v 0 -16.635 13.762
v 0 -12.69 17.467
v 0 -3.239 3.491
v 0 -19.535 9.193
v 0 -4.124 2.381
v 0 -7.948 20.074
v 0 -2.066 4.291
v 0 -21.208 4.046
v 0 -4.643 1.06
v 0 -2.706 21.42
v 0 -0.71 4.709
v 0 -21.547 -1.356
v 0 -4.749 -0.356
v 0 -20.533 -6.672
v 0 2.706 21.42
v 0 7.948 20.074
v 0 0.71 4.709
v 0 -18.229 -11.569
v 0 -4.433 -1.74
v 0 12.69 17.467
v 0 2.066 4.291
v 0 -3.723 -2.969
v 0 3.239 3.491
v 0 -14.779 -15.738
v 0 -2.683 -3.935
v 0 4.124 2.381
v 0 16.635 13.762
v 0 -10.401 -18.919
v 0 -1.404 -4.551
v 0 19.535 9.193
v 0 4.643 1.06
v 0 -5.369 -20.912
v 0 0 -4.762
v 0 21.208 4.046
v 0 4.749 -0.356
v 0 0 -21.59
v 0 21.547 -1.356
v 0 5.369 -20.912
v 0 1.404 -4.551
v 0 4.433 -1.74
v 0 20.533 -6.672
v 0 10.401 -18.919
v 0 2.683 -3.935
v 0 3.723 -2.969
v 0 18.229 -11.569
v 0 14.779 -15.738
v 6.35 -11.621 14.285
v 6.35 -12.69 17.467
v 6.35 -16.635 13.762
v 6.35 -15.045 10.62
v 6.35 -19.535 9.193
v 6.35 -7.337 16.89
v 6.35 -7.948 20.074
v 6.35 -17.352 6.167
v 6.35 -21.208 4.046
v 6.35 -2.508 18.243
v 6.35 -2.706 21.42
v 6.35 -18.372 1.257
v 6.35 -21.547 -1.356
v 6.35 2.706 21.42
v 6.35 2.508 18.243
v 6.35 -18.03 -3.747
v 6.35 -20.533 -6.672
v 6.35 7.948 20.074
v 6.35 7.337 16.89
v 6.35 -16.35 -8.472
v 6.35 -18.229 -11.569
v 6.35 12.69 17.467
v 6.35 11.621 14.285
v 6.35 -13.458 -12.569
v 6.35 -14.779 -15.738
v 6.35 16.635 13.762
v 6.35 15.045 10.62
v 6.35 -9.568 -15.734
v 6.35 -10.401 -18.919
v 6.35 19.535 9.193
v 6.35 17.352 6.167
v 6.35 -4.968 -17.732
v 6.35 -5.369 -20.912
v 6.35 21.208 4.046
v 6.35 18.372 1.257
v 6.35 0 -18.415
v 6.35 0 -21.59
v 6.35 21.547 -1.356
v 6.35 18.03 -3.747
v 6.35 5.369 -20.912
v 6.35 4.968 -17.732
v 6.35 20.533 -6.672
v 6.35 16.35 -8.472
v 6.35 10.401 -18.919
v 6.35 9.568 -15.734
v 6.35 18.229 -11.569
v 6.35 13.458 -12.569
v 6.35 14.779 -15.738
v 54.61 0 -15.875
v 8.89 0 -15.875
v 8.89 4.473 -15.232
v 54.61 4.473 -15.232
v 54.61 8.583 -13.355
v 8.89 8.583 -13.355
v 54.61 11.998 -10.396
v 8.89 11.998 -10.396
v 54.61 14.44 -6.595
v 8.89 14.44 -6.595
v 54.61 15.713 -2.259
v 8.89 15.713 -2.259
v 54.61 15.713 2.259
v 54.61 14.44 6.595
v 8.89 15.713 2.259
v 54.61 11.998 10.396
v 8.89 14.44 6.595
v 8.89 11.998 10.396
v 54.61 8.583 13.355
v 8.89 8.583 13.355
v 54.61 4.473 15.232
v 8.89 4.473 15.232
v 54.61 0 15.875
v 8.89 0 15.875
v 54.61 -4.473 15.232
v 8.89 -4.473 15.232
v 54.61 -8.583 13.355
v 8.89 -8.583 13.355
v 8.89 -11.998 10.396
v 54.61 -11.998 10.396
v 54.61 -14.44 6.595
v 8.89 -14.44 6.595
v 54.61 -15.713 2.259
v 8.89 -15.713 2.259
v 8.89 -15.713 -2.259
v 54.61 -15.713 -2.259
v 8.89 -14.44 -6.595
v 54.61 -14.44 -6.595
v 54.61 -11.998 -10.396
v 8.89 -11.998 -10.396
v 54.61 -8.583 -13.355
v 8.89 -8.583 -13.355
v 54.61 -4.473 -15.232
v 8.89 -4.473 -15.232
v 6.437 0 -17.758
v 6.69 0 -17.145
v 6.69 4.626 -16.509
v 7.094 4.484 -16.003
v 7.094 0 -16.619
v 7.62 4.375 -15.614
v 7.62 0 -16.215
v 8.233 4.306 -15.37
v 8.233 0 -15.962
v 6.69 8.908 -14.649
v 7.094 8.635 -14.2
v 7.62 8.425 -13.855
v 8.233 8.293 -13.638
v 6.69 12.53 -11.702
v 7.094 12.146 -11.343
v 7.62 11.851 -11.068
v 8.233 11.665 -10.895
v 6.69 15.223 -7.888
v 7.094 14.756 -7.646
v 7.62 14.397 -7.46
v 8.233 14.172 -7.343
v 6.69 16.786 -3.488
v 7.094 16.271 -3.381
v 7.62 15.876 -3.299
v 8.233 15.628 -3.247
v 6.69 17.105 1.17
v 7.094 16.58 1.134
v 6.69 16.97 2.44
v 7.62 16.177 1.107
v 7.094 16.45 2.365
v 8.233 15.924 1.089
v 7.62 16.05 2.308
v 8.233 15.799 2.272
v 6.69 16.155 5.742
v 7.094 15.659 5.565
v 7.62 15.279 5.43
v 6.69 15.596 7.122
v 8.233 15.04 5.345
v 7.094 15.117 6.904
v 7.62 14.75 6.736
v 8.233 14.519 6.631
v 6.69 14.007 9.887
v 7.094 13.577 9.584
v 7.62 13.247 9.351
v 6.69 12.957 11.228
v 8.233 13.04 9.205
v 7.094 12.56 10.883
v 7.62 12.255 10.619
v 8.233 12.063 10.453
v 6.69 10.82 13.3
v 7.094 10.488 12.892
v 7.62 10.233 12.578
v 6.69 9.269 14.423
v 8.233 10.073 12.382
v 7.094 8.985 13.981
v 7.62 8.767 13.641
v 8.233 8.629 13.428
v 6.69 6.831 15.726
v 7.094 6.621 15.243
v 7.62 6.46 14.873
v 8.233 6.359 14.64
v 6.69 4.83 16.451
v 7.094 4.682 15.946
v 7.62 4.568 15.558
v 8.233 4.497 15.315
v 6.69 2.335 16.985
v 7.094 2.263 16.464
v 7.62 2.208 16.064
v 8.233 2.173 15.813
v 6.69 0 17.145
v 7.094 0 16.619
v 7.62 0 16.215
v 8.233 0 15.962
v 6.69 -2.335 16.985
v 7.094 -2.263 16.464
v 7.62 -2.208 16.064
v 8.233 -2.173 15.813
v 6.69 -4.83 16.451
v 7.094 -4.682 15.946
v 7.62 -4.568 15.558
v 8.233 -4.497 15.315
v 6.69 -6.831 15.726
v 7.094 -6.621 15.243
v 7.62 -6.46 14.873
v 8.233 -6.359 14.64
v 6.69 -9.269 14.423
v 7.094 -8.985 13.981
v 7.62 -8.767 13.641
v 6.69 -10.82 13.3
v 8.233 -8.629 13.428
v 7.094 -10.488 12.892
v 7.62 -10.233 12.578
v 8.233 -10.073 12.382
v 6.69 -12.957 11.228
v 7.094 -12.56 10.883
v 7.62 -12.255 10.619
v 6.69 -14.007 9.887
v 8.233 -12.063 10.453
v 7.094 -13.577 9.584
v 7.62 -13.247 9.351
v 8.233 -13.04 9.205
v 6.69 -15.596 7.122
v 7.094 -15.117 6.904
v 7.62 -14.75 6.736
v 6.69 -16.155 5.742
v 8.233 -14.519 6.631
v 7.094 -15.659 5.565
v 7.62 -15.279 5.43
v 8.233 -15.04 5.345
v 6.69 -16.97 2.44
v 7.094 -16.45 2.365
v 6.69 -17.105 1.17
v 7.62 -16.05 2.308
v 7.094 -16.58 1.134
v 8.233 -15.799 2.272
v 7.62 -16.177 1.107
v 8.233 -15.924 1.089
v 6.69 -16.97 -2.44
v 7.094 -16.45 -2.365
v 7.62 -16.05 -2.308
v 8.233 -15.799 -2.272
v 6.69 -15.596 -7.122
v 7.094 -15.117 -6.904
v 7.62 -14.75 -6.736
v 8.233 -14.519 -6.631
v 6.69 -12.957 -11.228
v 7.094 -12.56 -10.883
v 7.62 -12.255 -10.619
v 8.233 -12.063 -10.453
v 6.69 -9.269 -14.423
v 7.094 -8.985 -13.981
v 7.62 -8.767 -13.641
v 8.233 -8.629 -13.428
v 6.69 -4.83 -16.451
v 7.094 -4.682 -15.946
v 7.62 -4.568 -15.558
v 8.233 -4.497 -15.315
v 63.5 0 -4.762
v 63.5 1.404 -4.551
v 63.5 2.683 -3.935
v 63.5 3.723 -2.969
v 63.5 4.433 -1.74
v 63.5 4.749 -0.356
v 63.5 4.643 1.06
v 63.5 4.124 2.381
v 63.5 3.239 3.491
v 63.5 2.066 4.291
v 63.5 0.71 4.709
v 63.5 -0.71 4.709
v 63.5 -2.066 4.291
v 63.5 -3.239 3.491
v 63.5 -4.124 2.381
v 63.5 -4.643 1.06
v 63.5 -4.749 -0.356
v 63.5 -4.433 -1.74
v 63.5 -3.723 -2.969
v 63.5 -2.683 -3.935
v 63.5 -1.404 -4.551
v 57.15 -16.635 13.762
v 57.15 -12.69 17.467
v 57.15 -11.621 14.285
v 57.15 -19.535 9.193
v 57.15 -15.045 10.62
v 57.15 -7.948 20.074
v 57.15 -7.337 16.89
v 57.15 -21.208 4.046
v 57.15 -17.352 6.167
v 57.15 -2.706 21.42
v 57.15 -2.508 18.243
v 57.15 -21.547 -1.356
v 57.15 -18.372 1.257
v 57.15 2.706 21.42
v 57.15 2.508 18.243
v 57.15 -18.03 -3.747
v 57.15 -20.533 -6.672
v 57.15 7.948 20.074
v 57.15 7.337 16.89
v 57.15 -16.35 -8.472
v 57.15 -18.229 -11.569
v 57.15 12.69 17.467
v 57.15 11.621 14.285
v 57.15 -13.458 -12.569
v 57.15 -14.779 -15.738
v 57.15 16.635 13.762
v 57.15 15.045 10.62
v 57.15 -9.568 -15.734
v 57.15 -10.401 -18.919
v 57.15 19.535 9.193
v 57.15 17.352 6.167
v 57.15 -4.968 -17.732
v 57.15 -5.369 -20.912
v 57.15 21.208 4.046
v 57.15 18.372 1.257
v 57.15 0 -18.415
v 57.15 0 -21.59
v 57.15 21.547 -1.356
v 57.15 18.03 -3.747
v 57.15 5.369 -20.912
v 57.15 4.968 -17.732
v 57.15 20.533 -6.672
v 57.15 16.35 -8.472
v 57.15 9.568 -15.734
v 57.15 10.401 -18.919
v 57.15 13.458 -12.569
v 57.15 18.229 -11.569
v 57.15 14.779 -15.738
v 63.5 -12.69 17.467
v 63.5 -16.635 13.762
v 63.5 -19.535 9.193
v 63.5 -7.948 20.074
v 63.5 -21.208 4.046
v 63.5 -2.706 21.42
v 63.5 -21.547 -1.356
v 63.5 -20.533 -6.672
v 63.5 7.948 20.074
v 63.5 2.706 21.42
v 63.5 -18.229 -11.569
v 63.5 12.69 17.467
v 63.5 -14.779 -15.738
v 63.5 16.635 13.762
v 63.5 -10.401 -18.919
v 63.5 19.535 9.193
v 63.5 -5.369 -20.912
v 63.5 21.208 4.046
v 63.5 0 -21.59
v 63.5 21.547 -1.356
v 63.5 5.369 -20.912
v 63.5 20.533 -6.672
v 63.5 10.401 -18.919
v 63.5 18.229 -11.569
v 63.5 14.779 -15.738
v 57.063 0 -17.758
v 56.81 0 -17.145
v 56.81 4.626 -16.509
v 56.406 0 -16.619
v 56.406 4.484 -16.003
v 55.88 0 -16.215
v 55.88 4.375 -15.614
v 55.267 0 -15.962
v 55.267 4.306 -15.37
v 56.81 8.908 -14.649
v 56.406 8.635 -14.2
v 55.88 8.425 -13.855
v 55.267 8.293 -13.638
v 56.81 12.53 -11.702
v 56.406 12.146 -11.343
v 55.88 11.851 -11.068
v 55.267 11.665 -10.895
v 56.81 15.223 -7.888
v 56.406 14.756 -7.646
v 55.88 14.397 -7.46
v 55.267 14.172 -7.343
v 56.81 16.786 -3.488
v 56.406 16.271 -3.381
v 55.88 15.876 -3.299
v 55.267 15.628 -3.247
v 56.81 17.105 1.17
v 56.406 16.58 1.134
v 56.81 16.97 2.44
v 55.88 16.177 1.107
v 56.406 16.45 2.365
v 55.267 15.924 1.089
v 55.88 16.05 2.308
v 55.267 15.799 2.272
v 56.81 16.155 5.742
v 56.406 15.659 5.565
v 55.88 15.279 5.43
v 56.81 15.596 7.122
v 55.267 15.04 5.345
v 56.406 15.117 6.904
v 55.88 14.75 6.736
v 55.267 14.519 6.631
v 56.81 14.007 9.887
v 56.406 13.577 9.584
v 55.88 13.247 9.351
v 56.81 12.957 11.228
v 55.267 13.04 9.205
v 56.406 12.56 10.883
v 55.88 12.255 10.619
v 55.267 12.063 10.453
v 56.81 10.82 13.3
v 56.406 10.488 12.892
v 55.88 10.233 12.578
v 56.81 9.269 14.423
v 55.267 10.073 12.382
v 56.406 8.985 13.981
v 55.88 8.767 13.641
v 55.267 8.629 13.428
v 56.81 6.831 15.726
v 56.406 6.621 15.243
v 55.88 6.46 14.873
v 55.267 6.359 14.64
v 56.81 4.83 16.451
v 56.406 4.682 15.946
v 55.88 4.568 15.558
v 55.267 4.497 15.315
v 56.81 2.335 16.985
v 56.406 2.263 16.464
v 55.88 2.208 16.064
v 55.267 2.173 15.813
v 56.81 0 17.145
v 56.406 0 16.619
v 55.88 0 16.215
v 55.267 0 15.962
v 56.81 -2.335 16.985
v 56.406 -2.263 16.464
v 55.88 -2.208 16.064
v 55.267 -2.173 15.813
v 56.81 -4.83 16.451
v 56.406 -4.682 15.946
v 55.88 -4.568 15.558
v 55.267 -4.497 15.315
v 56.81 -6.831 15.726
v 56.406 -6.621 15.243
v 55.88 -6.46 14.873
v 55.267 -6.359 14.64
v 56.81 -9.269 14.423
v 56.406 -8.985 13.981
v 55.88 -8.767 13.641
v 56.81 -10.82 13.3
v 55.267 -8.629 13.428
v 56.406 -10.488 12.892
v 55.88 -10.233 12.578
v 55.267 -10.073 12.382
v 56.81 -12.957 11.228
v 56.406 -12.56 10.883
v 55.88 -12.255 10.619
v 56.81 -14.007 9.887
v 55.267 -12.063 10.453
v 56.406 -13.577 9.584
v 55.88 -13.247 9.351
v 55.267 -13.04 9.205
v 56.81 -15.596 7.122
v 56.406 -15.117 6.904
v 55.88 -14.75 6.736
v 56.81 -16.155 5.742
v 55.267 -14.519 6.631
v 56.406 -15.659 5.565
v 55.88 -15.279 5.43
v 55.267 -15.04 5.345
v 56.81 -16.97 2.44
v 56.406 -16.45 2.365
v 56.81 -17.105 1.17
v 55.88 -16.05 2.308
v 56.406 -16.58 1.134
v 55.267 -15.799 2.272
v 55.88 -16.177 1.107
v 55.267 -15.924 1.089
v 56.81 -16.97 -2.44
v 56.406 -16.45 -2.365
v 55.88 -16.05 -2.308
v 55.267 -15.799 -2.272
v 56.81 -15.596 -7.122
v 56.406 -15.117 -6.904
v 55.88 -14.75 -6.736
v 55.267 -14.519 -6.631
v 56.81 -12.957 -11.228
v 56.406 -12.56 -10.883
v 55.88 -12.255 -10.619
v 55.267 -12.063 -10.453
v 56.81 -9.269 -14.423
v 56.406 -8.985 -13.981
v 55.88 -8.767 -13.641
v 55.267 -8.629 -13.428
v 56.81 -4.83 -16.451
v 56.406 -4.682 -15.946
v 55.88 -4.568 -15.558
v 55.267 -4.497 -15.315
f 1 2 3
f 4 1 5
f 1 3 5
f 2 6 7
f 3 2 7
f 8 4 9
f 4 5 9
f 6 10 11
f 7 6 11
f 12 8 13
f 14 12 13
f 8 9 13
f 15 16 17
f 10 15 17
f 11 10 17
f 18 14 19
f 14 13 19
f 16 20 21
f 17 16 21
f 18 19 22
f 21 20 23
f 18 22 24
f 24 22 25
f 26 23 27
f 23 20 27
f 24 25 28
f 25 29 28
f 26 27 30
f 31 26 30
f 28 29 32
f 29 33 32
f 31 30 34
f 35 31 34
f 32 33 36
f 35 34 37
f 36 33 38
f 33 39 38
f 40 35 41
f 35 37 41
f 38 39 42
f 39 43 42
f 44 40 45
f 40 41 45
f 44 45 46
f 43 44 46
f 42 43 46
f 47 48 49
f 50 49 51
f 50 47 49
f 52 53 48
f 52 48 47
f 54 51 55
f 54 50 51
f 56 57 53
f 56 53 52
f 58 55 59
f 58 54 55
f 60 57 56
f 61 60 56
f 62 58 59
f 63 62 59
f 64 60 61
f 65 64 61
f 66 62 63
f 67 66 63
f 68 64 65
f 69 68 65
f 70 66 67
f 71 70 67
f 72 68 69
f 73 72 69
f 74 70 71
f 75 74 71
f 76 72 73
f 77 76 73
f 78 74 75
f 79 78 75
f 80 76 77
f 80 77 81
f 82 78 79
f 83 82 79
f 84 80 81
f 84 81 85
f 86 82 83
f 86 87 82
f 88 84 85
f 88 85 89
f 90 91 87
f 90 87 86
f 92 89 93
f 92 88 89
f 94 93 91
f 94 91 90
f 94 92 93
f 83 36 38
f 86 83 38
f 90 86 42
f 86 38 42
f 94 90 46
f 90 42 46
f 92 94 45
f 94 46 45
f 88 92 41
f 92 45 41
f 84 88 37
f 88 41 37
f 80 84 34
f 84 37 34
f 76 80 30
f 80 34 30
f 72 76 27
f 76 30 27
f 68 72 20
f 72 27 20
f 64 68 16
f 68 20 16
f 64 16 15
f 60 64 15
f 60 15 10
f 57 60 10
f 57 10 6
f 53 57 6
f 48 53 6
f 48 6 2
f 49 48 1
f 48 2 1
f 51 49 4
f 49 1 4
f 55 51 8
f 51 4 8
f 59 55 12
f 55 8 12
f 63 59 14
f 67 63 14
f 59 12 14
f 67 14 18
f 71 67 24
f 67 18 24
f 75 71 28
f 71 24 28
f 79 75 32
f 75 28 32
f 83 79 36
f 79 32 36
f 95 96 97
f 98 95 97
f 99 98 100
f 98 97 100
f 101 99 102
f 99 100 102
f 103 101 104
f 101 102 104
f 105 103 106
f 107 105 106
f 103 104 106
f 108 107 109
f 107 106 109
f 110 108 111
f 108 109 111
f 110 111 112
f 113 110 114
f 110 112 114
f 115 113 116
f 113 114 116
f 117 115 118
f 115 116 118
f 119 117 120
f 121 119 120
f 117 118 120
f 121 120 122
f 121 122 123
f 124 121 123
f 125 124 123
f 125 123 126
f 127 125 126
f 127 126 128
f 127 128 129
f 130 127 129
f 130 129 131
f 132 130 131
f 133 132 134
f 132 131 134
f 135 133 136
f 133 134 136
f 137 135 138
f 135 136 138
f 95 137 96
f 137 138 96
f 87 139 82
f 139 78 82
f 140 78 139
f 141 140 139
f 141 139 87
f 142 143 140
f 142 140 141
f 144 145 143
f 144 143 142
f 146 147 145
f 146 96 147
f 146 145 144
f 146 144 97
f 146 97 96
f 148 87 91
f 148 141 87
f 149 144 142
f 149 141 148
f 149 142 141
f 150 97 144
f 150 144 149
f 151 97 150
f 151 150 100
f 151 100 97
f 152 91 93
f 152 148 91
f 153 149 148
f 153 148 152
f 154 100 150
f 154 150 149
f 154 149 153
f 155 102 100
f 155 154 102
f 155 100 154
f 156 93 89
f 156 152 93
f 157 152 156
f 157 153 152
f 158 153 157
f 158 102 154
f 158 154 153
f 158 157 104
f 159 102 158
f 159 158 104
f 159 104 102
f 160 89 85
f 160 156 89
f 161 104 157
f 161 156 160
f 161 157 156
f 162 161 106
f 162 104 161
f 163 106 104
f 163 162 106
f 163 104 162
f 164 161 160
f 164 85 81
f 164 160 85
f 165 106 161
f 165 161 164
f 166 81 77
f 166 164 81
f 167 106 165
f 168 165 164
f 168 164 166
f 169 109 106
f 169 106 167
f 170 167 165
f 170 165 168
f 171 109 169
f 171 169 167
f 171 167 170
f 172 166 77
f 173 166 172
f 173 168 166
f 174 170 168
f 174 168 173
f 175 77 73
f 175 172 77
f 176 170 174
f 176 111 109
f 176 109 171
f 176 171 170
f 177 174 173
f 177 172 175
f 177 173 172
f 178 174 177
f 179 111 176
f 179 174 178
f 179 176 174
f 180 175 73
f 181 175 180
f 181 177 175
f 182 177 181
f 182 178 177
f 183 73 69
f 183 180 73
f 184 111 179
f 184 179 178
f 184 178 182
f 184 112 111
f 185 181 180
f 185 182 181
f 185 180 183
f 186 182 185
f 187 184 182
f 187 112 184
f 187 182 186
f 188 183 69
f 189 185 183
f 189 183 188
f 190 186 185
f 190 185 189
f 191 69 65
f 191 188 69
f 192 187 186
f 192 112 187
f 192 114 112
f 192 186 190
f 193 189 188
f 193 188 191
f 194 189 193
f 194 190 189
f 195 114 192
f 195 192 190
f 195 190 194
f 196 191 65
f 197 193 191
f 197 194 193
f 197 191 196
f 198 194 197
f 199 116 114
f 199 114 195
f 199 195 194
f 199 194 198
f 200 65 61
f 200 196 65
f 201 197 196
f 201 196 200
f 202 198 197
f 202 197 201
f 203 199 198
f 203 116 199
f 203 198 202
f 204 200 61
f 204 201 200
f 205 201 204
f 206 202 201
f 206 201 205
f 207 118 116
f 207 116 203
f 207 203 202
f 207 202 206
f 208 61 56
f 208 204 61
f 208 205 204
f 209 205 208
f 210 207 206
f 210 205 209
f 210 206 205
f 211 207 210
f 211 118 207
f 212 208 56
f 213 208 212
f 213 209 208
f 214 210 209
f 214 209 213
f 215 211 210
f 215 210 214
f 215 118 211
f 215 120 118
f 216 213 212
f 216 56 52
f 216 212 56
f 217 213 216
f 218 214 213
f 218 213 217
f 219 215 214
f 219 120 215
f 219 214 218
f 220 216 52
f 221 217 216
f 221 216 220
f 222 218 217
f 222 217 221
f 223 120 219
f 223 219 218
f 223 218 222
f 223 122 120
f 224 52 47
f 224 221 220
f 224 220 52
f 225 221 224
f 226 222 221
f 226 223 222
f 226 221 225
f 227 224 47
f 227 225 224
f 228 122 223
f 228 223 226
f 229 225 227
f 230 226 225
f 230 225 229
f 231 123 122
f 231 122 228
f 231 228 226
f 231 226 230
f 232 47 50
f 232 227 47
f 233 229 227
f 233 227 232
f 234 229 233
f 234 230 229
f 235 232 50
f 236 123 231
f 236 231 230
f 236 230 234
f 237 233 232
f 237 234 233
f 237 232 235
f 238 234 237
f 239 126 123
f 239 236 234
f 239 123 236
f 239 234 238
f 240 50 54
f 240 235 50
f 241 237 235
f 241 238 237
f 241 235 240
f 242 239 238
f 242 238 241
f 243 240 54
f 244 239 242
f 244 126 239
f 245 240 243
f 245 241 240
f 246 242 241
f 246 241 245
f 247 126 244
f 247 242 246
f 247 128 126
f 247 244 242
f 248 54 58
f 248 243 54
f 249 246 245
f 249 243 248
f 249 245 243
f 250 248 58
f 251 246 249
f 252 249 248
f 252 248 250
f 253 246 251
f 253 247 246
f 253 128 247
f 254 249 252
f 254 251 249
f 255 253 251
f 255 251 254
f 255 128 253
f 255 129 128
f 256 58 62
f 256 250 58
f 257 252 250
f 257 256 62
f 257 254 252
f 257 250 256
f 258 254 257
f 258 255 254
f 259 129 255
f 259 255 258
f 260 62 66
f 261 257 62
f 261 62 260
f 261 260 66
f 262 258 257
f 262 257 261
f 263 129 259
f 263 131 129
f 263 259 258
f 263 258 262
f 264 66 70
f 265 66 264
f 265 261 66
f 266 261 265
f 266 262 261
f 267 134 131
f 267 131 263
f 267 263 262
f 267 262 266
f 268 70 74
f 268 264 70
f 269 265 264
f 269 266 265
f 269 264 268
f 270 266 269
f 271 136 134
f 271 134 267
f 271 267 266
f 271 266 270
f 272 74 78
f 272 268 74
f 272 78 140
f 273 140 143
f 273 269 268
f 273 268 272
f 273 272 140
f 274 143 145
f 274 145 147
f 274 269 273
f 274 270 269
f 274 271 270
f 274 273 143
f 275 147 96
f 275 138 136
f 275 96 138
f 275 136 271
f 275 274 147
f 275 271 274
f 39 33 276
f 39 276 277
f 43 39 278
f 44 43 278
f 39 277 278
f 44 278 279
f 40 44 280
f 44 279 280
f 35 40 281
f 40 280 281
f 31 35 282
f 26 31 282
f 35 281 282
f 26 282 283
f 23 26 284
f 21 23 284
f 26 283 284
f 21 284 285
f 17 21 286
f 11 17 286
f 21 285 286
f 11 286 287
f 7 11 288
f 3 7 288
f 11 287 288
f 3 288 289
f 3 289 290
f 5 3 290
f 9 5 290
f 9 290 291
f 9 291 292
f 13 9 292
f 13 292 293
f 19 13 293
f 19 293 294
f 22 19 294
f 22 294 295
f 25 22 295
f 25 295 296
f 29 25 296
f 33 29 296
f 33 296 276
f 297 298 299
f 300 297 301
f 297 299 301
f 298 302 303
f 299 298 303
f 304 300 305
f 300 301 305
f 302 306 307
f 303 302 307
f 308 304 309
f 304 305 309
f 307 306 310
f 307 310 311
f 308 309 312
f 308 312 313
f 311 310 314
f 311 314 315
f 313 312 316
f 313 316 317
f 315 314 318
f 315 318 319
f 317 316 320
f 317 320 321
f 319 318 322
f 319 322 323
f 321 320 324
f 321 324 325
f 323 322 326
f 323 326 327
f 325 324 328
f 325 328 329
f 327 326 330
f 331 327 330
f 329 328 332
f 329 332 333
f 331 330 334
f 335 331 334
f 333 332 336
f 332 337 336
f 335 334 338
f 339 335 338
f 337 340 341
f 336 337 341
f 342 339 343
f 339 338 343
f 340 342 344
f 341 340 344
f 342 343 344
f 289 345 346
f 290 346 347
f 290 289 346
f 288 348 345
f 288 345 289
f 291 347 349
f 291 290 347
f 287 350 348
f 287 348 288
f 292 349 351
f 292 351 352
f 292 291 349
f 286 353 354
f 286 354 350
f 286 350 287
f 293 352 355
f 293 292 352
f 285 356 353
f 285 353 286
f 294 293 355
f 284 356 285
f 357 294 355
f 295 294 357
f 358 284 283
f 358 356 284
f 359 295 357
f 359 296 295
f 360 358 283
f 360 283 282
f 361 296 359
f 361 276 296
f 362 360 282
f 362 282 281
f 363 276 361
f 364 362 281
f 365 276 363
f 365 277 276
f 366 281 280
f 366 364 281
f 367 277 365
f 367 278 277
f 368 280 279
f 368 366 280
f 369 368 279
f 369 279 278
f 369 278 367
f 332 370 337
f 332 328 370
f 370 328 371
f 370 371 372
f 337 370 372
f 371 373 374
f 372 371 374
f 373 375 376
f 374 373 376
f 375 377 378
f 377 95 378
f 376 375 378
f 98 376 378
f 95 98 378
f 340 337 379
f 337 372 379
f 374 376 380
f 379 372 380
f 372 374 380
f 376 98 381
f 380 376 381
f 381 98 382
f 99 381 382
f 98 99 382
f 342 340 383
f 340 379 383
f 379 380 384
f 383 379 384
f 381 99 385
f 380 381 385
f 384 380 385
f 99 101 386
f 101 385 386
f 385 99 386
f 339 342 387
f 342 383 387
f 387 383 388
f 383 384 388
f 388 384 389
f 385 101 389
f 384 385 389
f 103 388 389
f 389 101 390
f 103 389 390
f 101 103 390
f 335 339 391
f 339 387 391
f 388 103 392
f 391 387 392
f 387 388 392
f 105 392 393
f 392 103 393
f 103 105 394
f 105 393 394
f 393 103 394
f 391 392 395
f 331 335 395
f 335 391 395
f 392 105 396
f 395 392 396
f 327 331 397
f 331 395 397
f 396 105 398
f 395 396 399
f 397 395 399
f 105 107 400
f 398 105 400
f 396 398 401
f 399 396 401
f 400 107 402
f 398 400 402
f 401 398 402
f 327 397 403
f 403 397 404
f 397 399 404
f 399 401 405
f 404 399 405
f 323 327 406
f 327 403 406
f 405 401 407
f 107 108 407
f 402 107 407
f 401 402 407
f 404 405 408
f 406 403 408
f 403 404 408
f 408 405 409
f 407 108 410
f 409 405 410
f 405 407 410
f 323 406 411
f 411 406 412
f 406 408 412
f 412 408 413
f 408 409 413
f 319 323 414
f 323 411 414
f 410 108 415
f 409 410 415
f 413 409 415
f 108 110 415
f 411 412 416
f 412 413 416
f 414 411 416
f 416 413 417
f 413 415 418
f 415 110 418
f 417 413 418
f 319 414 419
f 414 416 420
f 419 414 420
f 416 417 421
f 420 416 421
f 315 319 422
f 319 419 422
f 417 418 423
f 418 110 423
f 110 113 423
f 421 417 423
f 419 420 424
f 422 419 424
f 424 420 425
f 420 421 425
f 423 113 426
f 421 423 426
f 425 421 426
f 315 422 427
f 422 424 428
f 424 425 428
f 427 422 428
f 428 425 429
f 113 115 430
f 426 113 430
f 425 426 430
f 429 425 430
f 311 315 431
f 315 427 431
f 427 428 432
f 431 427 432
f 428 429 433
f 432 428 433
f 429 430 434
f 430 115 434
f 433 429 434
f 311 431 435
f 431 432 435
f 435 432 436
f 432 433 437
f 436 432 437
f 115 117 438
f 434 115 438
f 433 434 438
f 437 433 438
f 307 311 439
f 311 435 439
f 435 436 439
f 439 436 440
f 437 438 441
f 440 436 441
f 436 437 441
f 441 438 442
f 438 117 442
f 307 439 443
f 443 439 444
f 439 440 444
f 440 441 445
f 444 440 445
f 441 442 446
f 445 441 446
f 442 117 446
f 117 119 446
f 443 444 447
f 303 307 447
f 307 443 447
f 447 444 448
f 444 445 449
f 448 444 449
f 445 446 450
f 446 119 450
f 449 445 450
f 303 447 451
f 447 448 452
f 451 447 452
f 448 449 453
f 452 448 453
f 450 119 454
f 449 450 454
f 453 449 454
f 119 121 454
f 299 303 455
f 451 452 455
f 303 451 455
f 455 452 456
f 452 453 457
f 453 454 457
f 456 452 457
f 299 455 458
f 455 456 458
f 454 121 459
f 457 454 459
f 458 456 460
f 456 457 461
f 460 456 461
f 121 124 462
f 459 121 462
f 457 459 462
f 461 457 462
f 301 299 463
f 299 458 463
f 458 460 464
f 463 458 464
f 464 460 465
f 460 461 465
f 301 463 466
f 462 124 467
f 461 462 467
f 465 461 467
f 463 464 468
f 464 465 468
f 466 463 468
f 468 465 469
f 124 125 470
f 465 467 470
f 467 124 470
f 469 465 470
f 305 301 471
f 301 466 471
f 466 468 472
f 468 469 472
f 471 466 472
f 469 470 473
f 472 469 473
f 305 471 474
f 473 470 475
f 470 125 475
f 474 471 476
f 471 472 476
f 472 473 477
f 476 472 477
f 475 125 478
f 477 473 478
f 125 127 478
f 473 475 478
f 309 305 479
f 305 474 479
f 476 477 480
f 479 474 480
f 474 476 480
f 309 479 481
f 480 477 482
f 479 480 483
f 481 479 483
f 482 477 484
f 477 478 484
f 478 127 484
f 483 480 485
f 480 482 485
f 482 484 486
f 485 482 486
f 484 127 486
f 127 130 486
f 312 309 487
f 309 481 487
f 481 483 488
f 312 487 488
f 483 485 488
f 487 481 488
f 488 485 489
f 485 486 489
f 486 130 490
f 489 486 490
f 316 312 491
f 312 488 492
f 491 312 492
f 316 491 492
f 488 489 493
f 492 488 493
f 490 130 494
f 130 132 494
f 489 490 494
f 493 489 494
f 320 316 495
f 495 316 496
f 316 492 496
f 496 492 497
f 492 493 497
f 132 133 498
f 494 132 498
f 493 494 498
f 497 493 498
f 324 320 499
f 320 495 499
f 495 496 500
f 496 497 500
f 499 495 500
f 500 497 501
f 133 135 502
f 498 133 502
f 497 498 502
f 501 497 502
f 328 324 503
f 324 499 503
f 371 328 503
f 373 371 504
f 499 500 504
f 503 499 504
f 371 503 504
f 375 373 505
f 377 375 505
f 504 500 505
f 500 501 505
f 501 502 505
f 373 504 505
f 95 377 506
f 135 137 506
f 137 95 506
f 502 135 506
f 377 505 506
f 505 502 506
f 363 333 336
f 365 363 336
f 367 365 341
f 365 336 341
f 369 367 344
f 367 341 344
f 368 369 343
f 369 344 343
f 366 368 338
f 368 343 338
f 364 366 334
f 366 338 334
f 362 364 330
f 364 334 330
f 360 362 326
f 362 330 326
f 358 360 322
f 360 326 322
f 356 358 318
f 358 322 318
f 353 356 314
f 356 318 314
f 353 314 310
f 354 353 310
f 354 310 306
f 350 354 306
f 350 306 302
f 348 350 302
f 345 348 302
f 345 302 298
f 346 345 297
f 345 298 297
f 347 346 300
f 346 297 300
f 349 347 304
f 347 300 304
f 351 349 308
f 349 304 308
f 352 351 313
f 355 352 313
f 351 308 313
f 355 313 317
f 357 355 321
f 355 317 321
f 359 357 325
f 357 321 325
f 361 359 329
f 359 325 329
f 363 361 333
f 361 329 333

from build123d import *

# Parameters (mm, degrees)
SKETCH1_R           = 21.59
BOSS_EXTRUDE1_DEPTH = 6.35
SKETCH2_R           = 15.875
BOSS_EXTRUDE2_DEPTH = 50.8
FILLET1_R           = 2.54
SKETCH3_R           = 21.59
BOSS_EXTRUDE3_DEPTH = 6.35
FILLET2_R           = 2.54
SKETCH4_R           = 4.7625
CUT_EXTRUDE1_DEPTH  = 71.459252054


with BuildPart() as part:
    # Sketch1 → Boss-Extrude1 (new body)
    with BuildSketch(Plane(origin=(0, 0, 0), x_dir=(0, 0, -1), z_dir=(1, 0, 0))):
        Circle(SKETCH1_R)
    extrude(amount=BOSS_EXTRUDE1_DEPTH)

    # Sketch2 → Boss-Extrude2 (add)
    with BuildSketch(Plane(origin=(6.35, 0, 0), x_dir=(0, 0, -1), z_dir=(1, 0, 0))):
        Circle(SKETCH2_R)
    extrude(amount=BOSS_EXTRUDE2_DEPTH)

    # Fillet1
    fillet1_edges = [part.edges().sort_by_distance(p)[0] for p in [
        (6.35, 0, 15.875),
    ]]
    fillet(fillet1_edges, radius=FILLET1_R)

    # Sketch3 → Boss-Extrude3 (add)
    with BuildSketch(Plane(origin=(57.15, 0, 0), x_dir=(0, 0, -1), z_dir=(1, 0, 0))):
        Circle(SKETCH3_R)
    extrude(amount=BOSS_EXTRUDE3_DEPTH)

    # Fillet2
    fillet2_edges = [part.edges().sort_by_distance(p)[0] for p in [
        (57.15, 0, 15.875),
    ]]
    fillet(fillet2_edges, radius=FILLET2_R)

    # Sketch4 → Cut-Extrude1 (cut, through all)
    with BuildSketch(Plane(origin=(63.5, 0, 0), x_dir=(0, 0, -1), z_dir=(1, 0, 0))):
        Circle(SKETCH4_R)
    extrude(amount=-CUT_EXTRUDE1_DEPTH, mode=Mode.SUBTRACT)


solid = part.part
